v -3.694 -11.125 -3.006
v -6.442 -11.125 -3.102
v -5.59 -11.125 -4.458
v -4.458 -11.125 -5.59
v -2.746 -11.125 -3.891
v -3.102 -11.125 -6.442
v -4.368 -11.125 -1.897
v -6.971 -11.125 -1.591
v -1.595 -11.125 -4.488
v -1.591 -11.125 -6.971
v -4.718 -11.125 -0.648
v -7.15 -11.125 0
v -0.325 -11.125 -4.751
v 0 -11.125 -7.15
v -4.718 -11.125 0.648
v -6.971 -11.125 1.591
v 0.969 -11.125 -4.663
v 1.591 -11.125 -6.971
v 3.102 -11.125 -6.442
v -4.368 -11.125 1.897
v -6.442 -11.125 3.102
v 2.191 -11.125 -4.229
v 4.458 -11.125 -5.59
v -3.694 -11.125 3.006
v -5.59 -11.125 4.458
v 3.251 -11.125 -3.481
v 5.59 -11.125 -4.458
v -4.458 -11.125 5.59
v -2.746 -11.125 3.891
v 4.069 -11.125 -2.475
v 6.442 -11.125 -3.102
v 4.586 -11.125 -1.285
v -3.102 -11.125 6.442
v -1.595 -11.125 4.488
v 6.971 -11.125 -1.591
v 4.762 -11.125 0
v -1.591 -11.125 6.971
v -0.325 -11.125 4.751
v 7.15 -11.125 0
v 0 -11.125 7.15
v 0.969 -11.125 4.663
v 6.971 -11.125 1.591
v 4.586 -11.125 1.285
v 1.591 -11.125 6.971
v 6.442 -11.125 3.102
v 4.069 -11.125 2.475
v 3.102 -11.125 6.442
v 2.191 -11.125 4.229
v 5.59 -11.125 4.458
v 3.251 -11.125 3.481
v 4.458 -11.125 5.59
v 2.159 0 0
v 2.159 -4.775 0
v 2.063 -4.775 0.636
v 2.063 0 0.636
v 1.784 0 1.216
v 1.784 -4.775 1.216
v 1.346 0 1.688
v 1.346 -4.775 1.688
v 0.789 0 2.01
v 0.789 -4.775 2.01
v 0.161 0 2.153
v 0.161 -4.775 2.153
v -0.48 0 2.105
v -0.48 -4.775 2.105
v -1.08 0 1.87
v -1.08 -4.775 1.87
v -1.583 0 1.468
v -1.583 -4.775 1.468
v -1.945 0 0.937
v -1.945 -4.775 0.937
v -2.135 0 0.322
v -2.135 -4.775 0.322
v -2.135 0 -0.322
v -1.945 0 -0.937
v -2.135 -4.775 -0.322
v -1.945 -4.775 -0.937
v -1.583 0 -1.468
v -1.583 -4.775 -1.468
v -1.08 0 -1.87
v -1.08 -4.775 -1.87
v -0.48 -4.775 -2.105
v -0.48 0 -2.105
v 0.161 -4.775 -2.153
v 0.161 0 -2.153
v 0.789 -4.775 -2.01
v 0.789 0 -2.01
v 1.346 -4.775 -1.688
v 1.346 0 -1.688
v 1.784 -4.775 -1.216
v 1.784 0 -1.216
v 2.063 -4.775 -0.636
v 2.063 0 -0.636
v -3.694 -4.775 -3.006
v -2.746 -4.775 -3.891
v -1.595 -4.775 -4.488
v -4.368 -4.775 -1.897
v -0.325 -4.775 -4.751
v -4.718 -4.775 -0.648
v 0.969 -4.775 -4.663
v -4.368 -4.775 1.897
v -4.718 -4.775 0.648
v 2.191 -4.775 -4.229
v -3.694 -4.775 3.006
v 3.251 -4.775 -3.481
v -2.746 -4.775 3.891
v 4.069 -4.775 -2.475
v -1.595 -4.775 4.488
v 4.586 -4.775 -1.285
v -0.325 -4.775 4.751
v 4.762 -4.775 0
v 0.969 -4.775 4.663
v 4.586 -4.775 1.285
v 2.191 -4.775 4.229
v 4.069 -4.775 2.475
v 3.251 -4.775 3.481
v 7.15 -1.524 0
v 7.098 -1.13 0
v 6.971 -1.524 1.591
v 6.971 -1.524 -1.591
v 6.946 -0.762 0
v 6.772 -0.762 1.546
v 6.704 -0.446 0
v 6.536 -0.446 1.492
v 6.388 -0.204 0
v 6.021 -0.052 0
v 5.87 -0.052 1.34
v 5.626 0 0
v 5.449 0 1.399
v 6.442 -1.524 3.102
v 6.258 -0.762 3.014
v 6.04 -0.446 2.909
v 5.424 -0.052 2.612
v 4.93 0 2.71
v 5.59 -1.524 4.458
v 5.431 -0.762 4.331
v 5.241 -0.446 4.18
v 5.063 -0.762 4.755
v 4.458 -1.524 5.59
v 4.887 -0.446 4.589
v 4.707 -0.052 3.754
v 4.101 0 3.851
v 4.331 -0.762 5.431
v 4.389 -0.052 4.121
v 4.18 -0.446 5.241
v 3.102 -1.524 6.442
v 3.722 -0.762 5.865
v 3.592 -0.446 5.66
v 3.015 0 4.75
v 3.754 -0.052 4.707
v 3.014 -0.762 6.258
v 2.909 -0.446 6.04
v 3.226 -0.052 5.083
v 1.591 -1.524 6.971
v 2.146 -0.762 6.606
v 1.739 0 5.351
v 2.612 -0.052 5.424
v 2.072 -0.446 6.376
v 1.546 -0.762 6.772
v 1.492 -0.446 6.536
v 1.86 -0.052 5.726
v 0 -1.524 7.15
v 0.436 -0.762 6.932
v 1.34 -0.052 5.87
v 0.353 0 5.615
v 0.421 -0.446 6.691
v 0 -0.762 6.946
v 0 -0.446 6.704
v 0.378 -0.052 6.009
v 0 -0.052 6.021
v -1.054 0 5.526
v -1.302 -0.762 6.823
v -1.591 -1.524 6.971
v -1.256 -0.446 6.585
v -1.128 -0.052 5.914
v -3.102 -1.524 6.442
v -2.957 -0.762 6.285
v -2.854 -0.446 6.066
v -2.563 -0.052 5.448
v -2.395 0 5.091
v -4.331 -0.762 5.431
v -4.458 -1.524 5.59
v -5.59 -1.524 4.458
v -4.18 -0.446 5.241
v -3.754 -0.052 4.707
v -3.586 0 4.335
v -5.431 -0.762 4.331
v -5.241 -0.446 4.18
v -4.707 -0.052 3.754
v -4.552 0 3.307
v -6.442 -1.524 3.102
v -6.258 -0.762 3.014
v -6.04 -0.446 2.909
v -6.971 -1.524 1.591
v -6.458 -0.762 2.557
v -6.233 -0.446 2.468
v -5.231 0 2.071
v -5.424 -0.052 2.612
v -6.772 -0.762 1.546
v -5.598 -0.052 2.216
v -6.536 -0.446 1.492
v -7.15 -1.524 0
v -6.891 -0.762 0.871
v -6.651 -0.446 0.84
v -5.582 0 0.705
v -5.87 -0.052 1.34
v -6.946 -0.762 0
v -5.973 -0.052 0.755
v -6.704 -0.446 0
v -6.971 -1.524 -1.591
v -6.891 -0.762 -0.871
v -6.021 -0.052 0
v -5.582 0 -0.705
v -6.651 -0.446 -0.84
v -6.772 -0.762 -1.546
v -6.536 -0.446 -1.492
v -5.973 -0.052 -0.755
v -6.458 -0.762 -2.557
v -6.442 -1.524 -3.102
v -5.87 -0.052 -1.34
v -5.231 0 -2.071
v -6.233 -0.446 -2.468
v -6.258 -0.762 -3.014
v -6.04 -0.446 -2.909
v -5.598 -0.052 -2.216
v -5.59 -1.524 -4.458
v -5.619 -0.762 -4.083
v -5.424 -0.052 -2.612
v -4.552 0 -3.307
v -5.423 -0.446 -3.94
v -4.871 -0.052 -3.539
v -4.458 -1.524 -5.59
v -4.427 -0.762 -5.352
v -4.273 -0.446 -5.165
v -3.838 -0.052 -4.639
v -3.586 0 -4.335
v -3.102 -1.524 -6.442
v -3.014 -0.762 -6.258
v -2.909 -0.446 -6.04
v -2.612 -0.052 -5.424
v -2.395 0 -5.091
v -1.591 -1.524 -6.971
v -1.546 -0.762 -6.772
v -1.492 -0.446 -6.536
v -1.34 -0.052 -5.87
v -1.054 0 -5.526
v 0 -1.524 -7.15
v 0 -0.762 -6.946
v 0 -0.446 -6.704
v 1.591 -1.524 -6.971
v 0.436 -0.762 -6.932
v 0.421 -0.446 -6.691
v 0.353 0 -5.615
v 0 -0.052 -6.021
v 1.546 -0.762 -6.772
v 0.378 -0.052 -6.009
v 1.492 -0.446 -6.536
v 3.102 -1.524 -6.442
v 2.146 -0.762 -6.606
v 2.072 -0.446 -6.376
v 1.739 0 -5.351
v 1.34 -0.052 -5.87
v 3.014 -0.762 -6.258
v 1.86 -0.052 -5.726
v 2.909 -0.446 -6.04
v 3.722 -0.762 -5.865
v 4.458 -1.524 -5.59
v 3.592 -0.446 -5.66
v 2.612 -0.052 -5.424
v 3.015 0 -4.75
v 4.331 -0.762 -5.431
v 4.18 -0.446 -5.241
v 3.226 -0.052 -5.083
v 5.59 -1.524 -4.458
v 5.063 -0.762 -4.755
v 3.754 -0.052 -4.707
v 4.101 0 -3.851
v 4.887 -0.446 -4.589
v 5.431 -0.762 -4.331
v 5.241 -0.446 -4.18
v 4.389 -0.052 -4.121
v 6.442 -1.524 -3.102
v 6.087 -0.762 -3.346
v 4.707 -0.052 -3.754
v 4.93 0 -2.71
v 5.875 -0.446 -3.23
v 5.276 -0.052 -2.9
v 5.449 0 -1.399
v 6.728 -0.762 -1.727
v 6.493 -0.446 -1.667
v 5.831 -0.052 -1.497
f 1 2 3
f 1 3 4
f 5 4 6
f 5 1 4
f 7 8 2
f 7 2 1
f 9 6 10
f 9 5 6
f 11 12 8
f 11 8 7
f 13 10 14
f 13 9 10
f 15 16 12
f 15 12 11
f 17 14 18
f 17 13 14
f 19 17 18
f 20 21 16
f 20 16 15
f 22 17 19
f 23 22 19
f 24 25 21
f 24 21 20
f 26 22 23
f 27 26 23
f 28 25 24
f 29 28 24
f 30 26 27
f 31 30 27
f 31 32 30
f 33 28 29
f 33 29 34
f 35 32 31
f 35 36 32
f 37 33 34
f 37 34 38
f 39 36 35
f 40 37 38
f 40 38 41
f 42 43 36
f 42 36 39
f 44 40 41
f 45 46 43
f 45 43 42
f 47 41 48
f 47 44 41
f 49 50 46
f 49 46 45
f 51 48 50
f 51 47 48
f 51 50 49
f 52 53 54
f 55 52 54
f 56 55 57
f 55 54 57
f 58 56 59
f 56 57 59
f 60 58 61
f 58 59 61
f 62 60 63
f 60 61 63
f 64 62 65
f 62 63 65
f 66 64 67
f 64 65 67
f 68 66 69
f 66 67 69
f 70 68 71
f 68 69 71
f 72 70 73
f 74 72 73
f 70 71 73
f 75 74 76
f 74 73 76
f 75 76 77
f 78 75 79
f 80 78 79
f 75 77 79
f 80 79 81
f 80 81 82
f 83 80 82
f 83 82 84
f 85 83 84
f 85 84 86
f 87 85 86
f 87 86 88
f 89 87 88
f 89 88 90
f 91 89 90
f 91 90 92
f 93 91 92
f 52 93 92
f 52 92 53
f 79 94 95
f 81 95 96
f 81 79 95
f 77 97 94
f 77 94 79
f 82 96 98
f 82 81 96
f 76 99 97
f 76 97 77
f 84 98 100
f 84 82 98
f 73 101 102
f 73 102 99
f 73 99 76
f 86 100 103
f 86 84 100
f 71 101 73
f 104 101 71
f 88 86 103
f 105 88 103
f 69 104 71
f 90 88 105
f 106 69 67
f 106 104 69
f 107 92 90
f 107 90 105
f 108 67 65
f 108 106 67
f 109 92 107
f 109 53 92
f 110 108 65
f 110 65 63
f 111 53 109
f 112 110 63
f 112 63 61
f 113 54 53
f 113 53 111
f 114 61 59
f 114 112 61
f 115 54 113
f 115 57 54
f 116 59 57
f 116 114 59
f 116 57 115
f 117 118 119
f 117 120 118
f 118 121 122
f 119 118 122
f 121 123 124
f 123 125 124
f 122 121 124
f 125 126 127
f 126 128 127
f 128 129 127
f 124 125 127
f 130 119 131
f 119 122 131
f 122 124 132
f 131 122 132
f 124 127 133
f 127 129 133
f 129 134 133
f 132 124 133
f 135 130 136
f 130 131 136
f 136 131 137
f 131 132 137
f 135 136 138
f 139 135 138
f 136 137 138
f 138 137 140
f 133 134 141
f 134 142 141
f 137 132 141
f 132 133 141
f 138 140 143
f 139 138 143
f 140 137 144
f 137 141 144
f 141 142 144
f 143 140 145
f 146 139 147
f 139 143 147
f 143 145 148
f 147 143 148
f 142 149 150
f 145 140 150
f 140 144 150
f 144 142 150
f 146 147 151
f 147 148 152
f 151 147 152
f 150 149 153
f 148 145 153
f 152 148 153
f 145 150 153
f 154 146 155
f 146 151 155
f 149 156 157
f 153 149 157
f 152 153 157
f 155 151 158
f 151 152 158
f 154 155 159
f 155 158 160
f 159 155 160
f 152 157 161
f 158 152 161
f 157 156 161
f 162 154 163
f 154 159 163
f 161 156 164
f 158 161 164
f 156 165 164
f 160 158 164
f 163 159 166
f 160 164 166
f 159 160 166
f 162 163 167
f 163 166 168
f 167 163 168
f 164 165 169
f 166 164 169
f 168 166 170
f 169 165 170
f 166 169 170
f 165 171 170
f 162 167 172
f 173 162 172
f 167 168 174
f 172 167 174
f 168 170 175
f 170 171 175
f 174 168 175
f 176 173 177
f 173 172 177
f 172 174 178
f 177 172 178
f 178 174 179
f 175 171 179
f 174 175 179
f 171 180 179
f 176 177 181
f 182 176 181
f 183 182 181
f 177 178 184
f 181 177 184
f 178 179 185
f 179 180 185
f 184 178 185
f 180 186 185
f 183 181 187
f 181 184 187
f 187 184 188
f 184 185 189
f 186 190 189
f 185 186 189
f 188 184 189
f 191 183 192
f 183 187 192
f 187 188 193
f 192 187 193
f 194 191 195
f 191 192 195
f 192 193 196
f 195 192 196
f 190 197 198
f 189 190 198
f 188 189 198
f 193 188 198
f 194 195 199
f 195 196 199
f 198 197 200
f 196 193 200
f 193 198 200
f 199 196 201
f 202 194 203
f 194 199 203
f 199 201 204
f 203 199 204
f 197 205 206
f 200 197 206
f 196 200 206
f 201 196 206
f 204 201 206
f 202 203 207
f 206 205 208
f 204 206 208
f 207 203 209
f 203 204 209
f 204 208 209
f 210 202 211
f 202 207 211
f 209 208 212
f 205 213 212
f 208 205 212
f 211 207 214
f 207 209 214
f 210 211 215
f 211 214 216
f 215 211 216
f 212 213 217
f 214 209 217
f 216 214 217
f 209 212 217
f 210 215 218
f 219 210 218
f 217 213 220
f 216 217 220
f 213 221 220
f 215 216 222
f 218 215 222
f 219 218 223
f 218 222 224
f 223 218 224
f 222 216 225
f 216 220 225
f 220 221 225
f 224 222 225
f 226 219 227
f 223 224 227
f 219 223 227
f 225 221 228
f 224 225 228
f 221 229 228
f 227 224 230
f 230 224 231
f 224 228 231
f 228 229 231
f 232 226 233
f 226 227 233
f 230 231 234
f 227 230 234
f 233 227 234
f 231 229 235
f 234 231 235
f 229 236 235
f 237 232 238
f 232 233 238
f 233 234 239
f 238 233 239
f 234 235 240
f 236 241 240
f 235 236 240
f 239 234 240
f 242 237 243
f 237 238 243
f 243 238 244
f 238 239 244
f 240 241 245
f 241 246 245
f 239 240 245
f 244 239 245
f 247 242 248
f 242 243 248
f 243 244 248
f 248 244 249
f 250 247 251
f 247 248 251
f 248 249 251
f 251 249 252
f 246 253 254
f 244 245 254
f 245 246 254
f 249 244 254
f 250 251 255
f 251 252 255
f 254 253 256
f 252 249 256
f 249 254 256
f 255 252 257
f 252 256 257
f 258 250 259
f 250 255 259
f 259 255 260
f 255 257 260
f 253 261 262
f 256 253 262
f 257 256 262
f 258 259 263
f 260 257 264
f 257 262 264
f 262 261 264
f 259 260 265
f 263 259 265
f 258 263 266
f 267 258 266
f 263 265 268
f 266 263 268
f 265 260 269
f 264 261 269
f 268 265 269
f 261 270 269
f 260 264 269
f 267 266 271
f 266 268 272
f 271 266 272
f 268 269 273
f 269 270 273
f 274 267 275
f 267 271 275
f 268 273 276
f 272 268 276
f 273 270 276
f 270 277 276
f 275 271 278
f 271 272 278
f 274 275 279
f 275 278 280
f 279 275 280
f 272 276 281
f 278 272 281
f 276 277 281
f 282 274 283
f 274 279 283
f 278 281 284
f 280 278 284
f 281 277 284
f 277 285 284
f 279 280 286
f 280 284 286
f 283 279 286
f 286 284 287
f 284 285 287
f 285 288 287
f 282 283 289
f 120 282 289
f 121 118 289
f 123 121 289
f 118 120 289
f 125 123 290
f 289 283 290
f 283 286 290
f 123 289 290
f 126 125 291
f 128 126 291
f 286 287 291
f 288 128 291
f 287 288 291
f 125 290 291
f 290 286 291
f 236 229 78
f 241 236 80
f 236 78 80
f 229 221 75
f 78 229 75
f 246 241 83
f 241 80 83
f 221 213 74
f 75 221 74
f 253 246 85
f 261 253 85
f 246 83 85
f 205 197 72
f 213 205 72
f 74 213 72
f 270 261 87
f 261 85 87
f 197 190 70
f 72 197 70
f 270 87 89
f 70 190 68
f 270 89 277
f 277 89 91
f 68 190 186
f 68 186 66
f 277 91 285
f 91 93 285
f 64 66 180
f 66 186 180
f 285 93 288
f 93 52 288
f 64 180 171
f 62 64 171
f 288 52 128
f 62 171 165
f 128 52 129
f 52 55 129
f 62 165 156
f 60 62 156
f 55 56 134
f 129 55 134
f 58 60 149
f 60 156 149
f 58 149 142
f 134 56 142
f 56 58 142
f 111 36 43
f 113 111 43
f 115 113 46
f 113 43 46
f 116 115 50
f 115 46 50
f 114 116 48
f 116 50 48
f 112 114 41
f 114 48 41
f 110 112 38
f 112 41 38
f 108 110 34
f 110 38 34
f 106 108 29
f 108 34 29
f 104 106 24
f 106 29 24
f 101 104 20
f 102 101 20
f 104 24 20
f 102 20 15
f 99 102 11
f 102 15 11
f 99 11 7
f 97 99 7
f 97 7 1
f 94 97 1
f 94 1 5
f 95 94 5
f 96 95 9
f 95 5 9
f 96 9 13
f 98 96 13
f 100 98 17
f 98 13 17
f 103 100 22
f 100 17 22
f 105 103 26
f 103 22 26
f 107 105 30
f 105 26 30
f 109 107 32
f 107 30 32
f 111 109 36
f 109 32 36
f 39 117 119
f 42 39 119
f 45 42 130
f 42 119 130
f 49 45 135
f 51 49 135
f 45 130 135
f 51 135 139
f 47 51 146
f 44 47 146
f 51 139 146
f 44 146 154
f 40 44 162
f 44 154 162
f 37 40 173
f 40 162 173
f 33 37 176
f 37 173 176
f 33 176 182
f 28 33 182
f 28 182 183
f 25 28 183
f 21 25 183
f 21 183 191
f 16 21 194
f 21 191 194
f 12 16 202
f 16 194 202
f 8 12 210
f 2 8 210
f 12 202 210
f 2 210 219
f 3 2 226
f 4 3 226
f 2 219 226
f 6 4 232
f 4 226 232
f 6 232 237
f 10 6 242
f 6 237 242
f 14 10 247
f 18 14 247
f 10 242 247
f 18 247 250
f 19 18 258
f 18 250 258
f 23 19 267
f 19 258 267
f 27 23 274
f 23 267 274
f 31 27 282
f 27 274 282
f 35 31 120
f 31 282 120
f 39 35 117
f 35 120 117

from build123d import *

# Parameters (mm, degrees)
F0_R     = 7.1501
F1_DEPTH = 11.1252
F2_R     = 2.159
F3_DEPTH = 11.1262
F4_R     = 4.7625
F5_DEPTH = 6.35
F6_R     = 1.524


with BuildPart() as f1:
    # F0 (on Front) → F1 (new body)
    with BuildSketch(Plane.XZ):
        Circle(F0_R)
    extrude(amount=F1_DEPTH)

    # F2 (on face) → F3 (cut, through all)
    with BuildSketch(Plane.XZ.offset(11.1252)):
        Circle(F2_R)
    extrude(amount=-F3_DEPTH, mode=Mode.SUBTRACT)

    # F4 (on face) → F5 (cut)
    with BuildSketch(Plane.XZ.offset(11.1252)):
        Circle(F4_R)
    extrude(amount=-F5_DEPTH, mode=Mode.SUBTRACT)

    # F6
    f6_edges = [f1.edges().sort_by_distance(p)[0] for p in [
        (-7.1501, 0, 0),
    ]]
    fillet(f6_edges, radius=F6_R)


solid = f1.part
